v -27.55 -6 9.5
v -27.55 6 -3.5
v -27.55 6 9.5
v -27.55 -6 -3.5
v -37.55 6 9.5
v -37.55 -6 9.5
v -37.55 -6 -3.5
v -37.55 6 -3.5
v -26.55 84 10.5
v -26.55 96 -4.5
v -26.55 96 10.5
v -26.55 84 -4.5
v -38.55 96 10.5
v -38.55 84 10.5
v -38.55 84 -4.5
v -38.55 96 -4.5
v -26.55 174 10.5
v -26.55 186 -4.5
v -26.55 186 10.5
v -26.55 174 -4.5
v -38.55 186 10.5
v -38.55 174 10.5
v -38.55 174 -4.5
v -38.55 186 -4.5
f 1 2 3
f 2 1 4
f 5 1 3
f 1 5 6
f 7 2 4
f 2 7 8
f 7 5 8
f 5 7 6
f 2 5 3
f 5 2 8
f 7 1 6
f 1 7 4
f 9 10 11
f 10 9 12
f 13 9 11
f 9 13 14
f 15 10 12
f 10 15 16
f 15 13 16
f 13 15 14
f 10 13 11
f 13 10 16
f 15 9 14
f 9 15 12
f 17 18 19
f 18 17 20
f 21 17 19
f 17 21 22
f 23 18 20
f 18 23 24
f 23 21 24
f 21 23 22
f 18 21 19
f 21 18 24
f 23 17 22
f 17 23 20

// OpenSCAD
// file: PiDimensions.scad
// Dimensions for raspberry Pis

hole_offset = 3.5;
e = 0.001;

// gap between board and walls (y)
gap = 0.4;

outer_radius = 7;
inner_radius = 1;

// thickness of sides
top_thick = 1.2;
side_thick = 1.2;
hat_height = 17;
sweep_height = 10;

standoff_height = 7;
standoff_radius = 3;

corner_support_radius = 5.5;
corner_support_hole = 3;
corner_space_left = 2 * corner_support_radius;


pin_height = 2;

pin_radius = 1.1;


thickness = 1.2; // mm for board

split = top_thick
    +standoff_height
    +thickness
    +8;


// width
// depth

NAME=0;
WIDTH=1;
DEPTH=2;
HEIGHT=3;
HATS=9;
SPACE_LEFT = 10;
SPACE_RIGHT = 11;

// https://www.raspberrypi.org/documentation/hardware/raspberrypi/mechanical/rpi_MECH_3aplus.pdf

function params_pi3A() = [
  "Pi3A",
  65+.10, /* width */
  56+.10, /* depth */
  12,     /* height of highest point */
  10.6,   /* center of USB for power */
  10.6,   /* center of second USB (if none use same) */
  32.0,   /* hdmi offset */
  17.0,   /* hdmi width */
   8.0,   /* hdmi height */
   1.0,   /* hats */
   6.0,   /* space left */
   6.0,   /* space right */
];

function params_pi3B() = [
  "Pi3B",
  65+.10, /* width */
  56+.10, /* depth */
  12.0,   /* height of highest point */
  10.6,   /* center of USB for power */
  10.6,   /* center of second USB (if none use same) */
  32.0,   /* hdmi offset */
  17.0,   /* hdmi width */
   8.0,   /* hdmi height */
   1.0,   /* hats */
   6.0,   /* space left */
   16.0,  /* space right */
];

function params_piW() = [
  "PiW",
  65+.10, /* width */
  30+.10, /* depth */
  12.0,     /* height of highest point */
  54,     /* center of USB for power */
  41.4,   /* center of second USB (if none use same) */
  12.4,   /* hdmi offset */
  15.0,   /* hdmi width */
   7.0,   /* hdmi height */
   1.0,   /* hats */
   6.0,   /* space left */
   6.0,   /* space right */
];

function examples() = [
  [0, params_piW(), "red"],
  [90, params_pi3A(), "green"],
  [180, params_pi3B(), "blue"]
];

// use in a loop
//for (ex = examples())
//    translate([0,ex[0],0])
//    usb_plus(ex[1]);


// Sweeps a connector up to clear a path for it
module sweep(h=0)
{
   hull()
   {
       children();
       translate([0,0,sweep_height-h])
       children();
   }
}
// main file
// SD Card on Raspberry Pi
include <PiDimensions.scad>;

sd_card_width = 12;

module sd_card(params) {
  width = params[1];
  depth = params[2];
  space_above = 6;

  if (params[NAME] == "PiW")
  {
    // top_side of board
    translate([-width/2, 0, 3])
      cube([10,sd_card_width,6+7], center=true);
    // 5 gives room to insert
    
  }
  else
  {
    translate([-width/2, 0, 3])
      cube([12,sd_card_width,15], center=true);
    // 5 gives room to insert
  }

}

for (ex = examples())
    translate([0,ex[0],0])
    sd_card(ex[1]);
